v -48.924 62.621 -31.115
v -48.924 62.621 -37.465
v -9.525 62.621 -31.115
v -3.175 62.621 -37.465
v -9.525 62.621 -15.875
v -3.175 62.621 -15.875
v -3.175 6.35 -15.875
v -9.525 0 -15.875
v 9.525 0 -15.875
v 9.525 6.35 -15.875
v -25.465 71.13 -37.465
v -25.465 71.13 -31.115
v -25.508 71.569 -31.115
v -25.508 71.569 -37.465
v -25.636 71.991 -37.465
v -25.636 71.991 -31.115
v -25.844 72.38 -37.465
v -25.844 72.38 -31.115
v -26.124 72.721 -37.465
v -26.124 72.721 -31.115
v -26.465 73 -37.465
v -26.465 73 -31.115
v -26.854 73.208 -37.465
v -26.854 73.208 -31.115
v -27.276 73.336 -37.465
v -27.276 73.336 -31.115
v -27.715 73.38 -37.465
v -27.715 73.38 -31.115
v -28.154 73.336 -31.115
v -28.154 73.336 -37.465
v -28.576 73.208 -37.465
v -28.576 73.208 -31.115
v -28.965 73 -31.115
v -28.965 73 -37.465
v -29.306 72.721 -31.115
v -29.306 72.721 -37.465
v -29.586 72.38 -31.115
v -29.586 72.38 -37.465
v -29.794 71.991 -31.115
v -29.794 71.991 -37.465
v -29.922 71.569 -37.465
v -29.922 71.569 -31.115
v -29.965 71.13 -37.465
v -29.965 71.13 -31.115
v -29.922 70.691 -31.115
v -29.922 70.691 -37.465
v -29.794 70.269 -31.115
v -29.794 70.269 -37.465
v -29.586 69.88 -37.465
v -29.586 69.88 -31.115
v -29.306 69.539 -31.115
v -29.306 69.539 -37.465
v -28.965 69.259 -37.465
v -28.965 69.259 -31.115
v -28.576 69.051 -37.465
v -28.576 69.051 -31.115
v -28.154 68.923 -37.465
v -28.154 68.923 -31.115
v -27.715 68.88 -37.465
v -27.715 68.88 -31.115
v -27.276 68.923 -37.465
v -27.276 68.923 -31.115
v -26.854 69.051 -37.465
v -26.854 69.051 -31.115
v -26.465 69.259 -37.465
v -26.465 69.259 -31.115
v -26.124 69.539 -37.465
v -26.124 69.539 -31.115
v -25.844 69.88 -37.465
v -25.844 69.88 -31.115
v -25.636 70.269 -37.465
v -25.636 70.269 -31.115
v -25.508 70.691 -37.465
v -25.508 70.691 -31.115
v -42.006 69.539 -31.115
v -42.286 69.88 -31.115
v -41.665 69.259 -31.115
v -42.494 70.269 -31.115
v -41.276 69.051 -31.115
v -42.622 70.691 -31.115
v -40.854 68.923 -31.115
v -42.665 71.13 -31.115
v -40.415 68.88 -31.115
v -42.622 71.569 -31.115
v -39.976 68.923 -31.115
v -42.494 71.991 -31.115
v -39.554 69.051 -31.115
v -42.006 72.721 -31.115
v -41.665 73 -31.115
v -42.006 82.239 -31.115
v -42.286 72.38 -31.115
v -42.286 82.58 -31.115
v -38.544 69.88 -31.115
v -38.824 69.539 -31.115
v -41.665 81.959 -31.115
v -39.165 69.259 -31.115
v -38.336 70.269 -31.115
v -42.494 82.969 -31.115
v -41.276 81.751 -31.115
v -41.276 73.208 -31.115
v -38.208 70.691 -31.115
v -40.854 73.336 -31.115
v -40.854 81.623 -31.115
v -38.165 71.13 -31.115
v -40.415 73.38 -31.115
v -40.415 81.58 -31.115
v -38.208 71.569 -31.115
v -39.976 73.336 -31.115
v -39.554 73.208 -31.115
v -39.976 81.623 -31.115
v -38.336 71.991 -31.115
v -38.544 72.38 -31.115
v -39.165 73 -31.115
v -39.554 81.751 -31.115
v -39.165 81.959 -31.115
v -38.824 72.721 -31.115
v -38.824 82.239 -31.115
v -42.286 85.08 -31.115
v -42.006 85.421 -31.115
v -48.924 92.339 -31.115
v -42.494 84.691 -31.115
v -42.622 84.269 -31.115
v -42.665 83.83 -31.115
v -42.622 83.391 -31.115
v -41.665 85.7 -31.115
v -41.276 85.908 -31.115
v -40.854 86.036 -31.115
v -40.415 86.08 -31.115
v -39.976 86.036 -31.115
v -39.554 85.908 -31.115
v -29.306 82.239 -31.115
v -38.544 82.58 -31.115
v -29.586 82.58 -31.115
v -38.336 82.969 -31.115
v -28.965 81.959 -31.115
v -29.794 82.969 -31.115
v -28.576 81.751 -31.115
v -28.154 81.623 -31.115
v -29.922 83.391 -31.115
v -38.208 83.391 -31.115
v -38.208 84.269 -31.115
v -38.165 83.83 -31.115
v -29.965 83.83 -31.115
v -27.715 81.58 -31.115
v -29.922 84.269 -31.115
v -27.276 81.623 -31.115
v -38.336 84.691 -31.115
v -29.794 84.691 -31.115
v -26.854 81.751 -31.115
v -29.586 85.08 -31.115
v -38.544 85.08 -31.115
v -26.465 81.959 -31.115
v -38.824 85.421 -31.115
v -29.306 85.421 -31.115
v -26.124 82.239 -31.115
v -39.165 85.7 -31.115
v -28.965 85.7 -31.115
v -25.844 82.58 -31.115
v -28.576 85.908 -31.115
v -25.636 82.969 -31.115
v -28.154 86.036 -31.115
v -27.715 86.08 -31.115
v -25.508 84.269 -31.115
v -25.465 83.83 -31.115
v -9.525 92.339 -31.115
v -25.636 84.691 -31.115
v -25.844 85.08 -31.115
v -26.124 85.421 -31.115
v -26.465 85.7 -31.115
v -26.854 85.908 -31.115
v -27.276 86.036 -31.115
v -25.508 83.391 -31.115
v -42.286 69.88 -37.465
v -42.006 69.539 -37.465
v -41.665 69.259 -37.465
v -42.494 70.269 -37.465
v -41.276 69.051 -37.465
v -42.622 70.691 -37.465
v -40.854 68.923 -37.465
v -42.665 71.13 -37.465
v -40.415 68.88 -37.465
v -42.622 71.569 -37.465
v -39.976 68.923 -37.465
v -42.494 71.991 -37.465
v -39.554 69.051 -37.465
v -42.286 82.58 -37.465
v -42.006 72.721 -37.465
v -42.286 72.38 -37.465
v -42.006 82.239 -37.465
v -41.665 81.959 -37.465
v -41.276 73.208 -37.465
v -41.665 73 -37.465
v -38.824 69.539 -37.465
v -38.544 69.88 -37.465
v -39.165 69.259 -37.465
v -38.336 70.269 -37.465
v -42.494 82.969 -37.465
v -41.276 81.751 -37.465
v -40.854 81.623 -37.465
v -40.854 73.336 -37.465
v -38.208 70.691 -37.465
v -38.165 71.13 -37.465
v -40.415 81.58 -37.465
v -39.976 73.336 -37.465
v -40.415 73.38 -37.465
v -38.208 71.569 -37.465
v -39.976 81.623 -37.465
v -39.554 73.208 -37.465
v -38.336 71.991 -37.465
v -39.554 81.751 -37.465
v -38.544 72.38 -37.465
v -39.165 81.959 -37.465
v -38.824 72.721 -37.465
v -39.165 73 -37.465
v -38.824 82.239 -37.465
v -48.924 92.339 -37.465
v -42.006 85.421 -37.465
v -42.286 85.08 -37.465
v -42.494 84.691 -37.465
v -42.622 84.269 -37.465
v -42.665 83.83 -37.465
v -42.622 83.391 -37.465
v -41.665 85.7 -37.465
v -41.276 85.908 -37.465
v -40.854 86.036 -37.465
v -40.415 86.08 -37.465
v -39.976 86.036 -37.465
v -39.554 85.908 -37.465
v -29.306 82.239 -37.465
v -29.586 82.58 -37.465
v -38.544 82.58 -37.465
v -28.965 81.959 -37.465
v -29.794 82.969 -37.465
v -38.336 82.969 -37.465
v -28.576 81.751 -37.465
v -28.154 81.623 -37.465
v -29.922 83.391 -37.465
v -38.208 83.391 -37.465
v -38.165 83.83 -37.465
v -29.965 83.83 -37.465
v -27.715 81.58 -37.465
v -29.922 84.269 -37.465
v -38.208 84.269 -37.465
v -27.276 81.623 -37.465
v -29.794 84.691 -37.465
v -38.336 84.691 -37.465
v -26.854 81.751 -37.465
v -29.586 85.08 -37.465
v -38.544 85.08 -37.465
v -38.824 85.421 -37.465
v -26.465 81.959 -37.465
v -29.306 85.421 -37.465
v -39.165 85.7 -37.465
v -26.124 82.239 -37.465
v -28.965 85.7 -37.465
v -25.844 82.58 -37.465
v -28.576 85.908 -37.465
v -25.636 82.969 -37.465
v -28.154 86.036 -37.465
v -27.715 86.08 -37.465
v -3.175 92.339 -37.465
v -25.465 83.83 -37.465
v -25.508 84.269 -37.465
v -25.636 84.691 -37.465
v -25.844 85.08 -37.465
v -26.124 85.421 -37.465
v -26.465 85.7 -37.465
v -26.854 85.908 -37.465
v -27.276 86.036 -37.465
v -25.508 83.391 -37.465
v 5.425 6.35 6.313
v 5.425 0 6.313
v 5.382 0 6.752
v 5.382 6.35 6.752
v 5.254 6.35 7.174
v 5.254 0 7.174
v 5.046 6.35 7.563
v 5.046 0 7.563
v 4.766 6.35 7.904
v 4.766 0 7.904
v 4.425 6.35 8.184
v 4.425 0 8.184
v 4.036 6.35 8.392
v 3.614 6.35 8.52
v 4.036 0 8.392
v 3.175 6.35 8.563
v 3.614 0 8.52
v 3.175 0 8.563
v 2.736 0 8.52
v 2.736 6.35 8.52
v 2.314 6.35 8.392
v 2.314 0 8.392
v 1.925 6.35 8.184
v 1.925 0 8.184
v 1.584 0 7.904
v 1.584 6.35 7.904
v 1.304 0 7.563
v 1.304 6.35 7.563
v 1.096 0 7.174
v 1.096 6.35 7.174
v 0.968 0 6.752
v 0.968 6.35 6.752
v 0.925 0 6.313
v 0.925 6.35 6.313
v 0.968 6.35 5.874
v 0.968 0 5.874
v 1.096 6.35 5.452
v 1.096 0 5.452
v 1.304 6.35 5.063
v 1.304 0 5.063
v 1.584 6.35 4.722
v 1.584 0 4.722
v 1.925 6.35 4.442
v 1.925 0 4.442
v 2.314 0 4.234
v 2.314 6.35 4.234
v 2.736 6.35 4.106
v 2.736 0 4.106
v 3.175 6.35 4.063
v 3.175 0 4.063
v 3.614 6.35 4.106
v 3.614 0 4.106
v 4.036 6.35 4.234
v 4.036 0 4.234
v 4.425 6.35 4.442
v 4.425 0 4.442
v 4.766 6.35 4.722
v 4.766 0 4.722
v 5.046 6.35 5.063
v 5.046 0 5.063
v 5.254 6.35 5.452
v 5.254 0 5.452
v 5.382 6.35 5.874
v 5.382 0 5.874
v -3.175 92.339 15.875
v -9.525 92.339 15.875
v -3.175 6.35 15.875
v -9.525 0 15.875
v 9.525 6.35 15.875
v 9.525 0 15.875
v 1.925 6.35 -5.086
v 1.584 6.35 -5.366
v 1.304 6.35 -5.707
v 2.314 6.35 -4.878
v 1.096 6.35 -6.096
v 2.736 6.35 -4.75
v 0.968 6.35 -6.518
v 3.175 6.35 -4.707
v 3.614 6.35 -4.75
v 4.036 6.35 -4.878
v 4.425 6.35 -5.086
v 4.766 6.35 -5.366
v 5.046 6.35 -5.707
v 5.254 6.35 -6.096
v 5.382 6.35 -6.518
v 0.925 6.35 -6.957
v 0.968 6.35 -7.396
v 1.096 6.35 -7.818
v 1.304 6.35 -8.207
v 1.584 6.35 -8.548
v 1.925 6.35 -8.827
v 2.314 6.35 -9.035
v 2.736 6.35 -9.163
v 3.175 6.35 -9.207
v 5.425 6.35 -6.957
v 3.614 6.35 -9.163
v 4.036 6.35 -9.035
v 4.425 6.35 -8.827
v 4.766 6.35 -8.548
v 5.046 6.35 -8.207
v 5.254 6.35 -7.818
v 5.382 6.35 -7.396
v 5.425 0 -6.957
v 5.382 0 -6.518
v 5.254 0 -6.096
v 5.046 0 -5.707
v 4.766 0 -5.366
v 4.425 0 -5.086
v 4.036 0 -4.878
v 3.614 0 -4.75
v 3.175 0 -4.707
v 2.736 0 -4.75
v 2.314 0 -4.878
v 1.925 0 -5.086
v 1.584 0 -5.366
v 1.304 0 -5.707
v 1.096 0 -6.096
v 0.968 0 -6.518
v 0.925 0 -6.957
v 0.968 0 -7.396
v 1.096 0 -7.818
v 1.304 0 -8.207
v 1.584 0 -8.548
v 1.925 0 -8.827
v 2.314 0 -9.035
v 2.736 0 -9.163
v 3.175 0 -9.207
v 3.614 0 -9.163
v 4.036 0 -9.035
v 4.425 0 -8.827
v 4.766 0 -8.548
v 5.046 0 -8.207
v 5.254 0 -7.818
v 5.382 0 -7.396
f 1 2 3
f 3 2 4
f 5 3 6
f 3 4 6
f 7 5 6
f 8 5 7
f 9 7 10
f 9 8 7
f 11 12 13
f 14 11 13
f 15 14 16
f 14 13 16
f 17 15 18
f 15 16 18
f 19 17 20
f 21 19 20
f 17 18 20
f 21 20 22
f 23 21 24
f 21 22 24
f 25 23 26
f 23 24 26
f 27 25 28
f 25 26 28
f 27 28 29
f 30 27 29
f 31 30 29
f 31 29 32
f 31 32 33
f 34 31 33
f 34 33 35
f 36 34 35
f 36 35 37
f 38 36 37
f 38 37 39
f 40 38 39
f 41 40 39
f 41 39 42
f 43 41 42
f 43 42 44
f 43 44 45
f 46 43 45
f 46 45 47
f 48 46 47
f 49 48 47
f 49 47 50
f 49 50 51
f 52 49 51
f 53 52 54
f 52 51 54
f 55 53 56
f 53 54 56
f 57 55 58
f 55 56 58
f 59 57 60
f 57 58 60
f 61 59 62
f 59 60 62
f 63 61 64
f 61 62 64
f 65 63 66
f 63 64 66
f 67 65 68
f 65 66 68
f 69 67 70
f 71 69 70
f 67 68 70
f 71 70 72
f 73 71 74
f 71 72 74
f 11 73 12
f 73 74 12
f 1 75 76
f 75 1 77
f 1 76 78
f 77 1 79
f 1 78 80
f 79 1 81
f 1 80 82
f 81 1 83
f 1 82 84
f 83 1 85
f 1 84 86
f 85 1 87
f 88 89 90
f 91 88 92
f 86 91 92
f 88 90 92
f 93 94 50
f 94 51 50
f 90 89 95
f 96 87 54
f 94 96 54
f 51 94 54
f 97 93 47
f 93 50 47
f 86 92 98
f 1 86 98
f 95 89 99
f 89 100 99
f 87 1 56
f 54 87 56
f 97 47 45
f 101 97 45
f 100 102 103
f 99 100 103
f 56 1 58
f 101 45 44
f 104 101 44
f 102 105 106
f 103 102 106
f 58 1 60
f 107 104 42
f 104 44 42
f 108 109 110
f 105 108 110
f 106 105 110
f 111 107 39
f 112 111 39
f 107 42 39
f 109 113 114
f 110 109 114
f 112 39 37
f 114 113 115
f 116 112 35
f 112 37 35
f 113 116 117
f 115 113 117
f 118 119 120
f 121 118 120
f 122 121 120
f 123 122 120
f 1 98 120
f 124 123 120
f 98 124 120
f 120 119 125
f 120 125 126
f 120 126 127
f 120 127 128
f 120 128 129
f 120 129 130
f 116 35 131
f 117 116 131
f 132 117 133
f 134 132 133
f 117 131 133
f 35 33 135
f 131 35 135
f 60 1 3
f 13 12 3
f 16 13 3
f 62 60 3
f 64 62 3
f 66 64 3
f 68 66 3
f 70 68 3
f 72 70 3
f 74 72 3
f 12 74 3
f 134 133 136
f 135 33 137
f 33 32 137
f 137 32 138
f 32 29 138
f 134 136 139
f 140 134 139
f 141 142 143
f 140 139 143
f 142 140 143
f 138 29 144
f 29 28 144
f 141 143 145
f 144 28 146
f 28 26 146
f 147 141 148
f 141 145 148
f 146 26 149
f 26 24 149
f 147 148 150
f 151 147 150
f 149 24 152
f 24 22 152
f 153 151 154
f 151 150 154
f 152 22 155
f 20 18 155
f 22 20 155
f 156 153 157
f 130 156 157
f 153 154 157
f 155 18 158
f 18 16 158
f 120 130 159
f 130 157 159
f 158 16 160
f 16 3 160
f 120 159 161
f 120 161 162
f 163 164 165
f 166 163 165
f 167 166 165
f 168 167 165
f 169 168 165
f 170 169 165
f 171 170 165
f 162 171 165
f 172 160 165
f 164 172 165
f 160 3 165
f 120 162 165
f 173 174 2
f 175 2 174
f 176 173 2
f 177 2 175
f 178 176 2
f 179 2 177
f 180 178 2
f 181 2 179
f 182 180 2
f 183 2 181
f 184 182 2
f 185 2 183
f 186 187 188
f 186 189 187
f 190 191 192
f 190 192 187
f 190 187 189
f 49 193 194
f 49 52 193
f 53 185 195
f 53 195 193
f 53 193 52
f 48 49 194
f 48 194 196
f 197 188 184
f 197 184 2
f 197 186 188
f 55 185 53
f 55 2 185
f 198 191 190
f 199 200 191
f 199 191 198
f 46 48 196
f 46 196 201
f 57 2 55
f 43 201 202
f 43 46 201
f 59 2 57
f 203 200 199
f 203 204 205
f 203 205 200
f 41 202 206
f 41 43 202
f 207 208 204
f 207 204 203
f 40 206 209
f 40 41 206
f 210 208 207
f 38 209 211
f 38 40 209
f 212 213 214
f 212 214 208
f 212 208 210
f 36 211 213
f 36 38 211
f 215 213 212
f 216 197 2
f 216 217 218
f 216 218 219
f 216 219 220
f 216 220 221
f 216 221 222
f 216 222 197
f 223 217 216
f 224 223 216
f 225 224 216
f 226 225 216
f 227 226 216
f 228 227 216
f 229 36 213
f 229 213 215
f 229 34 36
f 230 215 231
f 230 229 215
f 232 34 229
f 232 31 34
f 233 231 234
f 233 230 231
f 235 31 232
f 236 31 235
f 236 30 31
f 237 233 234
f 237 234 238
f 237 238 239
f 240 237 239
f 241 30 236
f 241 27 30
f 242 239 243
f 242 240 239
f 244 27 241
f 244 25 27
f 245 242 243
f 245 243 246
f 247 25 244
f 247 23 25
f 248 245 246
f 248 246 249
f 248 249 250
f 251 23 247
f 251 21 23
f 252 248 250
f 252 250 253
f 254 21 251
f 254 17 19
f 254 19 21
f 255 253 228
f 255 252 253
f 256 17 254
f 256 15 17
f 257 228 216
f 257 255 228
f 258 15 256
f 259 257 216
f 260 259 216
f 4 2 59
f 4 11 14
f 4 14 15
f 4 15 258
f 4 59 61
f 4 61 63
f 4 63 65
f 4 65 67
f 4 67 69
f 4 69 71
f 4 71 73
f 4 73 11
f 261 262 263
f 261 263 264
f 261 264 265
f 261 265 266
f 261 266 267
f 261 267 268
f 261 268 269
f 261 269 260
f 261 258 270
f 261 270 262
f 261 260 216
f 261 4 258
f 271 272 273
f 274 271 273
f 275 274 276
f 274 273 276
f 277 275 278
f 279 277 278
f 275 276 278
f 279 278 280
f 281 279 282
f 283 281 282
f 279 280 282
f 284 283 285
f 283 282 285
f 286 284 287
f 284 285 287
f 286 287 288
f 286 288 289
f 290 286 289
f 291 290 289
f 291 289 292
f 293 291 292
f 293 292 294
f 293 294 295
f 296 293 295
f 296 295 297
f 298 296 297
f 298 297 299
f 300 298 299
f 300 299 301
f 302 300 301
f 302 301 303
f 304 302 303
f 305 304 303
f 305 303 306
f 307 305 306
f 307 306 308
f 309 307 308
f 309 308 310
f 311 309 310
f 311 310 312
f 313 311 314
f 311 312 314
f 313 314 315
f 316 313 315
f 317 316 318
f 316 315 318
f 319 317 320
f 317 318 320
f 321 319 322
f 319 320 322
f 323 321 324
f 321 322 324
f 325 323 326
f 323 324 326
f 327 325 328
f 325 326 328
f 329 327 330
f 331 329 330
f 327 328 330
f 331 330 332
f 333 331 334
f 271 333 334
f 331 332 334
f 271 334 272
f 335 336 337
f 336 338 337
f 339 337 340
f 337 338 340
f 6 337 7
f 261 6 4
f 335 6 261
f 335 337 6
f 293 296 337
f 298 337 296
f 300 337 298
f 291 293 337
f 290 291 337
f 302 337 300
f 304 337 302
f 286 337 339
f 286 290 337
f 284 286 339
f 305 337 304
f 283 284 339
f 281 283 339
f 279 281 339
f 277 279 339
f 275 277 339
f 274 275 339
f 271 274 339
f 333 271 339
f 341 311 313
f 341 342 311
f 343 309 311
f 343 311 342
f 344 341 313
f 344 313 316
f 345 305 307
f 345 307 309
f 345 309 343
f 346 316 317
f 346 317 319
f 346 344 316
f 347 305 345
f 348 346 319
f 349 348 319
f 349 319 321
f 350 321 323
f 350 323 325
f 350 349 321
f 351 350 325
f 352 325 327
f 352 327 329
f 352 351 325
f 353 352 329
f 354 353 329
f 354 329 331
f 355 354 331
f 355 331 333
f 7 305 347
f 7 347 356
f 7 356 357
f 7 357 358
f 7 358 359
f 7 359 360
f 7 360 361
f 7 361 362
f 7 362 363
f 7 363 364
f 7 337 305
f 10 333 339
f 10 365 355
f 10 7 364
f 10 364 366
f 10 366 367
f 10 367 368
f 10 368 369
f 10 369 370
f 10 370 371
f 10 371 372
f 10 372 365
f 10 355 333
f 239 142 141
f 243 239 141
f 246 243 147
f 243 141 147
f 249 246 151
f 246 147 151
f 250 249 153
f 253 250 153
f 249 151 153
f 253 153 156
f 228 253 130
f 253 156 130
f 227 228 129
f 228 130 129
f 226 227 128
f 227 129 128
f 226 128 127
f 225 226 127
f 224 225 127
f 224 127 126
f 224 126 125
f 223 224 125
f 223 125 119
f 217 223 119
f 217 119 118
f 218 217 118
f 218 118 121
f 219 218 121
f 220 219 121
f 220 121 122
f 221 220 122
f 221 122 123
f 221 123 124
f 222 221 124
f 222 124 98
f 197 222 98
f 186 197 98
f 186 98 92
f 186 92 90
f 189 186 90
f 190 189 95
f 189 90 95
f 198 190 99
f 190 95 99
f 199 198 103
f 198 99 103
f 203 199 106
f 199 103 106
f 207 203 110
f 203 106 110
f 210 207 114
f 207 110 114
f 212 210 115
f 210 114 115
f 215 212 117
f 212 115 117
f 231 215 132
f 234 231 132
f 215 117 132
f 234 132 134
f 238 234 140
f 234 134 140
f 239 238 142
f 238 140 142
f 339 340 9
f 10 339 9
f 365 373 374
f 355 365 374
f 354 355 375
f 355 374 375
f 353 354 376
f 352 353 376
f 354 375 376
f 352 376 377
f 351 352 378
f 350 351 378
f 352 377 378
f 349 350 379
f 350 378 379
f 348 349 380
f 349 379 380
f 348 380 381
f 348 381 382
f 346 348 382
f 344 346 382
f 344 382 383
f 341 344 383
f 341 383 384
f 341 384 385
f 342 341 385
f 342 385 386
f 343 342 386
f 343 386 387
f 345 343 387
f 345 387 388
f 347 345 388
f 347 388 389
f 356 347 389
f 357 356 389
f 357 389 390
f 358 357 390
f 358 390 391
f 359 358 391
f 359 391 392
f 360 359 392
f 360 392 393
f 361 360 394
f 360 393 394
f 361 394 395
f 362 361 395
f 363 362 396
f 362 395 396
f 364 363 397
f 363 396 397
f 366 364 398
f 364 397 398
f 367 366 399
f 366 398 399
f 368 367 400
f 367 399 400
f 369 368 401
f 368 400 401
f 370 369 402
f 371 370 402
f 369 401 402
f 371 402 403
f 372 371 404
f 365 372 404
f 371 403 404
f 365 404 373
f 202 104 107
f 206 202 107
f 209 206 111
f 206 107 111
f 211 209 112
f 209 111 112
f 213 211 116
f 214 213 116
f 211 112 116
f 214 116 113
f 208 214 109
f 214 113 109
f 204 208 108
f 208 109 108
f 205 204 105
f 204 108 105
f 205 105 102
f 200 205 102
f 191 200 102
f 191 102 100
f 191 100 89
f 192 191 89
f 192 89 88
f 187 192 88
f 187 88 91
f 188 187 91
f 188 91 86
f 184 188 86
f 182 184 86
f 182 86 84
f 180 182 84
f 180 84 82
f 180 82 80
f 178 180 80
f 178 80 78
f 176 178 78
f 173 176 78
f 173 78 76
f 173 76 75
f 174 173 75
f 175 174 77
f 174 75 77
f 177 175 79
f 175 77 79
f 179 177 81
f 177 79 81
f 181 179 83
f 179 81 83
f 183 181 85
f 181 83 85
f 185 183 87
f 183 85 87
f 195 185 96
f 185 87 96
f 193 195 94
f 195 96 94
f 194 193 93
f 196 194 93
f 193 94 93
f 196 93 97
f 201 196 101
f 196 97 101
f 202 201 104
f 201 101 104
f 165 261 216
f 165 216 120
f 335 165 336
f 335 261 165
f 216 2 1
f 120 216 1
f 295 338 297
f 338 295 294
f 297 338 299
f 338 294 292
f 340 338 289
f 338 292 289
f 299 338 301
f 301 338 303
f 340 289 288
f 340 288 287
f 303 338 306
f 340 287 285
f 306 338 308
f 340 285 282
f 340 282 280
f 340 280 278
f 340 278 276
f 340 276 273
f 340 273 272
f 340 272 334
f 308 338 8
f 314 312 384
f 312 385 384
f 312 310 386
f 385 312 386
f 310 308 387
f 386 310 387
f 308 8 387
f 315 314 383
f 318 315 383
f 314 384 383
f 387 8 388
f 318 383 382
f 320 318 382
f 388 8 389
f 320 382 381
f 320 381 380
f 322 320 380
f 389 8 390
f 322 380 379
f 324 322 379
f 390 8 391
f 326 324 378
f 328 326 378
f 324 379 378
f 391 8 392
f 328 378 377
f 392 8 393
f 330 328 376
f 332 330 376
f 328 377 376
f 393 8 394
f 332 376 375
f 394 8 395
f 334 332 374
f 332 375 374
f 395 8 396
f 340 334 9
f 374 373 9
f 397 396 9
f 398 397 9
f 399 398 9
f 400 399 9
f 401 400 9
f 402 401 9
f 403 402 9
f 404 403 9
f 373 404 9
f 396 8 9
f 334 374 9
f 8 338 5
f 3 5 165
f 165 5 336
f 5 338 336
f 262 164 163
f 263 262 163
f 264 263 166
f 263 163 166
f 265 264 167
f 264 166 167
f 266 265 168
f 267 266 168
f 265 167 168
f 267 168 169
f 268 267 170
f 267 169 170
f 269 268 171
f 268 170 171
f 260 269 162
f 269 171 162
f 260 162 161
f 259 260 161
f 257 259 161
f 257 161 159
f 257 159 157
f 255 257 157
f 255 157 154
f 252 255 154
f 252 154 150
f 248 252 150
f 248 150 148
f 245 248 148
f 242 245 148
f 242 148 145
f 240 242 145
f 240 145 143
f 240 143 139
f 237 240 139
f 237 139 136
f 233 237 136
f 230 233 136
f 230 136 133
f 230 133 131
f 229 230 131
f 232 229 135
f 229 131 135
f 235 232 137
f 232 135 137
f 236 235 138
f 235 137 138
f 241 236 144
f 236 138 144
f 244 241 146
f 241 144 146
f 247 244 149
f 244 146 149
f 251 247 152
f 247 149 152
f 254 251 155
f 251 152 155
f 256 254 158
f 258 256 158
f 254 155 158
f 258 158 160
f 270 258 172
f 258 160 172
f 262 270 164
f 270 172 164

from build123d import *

# Parameters (mm, degrees)
SKETCH1_W            = 19.05
SKETCH1_H            = 31.75
EXTRUDE1_DEPTH       = 6.35
SKETCH3_W            = 6.35
SKETCH3_H            = 31.75
EXTRUDE2_DEPTH       = 85.9886012
SKETCH4_W            = 6.35
SKETCH4_H            = 29.718
EXTRUDE3_DEPTH       = 21.59
SKETCH5_W            = 6.35
SKETCH5_H            = 29.718
EXTRUDE4_DEPTH       = 39.399
M4_CLEARANCE_HOLE1_D = 4.5
M4_CLEARANCE_HOLE2_D = 4.5


with BuildPart() as part:
    # Sketch1 → Extrude1 (new body)
    with BuildSketch(Plane(origin=(0, 0, 0), x_dir=(1, 0, 0), z_dir=(0, 1, 0))):
        Rectangle(SKETCH1_W, SKETCH1_H)
    extrude(amount=EXTRUDE1_DEPTH)

    # Sketch3 → Extrude2 (add)
    with BuildSketch(Plane(origin=(0, 6.35, 0), x_dir=(1, 0, 0), z_dir=(0, 1, 0))):
        with Locations((-6.35, 0)):
            Rectangle(SKETCH3_W, SKETCH3_H)
    extrude(amount=EXTRUDE2_DEPTH)

    # Sketch4 → Extrude3 (add)
    with BuildSketch(Plane(origin=(0, 0, -15.875), x_dir=(-1, 0, 0), z_dir=(0, 0, -1))):
        with Locations((6.35, 77.4796012)):
            Rectangle(SKETCH4_W, SKETCH4_H)
    extrude(amount=EXTRUDE3_DEPTH)

    # Sketch5 → Extrude4 (add)
    with BuildSketch(Plane.ZY.offset(9.525)):
        with Locations((-34.29, 77.4796012)):
            Rectangle(SKETCH5_W, SKETCH5_H)
    extrude(amount=EXTRUDE4_DEPTH)

    # M4 Clearance Hole1 (through all)
    with Locations(Plane(origin=(30.89, -14.85899888, -37.465), x_dir=(-1, 0, 0), z_dir=(0, 0, -1))):
        with Locations((71.305, 85.98860008), (58.605, 85.98860008), (58.605, 98.68860008), (71.305, 98.68860008)):
            Hole(M4_CLEARANCE_HOLE1_D / 2)

    # M4 Clearance Hole2 (through all)
    with Locations(Plane(origin=(0, 6.35, 0), x_dir=(-1, 0, 0), z_dir=(0, 1, 0))):
        with Locations((-3.175, 6.313141271), (-3.175, -6.956578863)):
            Hole(M4_CLEARANCE_HOLE2_D / 2)


solid = part.part
